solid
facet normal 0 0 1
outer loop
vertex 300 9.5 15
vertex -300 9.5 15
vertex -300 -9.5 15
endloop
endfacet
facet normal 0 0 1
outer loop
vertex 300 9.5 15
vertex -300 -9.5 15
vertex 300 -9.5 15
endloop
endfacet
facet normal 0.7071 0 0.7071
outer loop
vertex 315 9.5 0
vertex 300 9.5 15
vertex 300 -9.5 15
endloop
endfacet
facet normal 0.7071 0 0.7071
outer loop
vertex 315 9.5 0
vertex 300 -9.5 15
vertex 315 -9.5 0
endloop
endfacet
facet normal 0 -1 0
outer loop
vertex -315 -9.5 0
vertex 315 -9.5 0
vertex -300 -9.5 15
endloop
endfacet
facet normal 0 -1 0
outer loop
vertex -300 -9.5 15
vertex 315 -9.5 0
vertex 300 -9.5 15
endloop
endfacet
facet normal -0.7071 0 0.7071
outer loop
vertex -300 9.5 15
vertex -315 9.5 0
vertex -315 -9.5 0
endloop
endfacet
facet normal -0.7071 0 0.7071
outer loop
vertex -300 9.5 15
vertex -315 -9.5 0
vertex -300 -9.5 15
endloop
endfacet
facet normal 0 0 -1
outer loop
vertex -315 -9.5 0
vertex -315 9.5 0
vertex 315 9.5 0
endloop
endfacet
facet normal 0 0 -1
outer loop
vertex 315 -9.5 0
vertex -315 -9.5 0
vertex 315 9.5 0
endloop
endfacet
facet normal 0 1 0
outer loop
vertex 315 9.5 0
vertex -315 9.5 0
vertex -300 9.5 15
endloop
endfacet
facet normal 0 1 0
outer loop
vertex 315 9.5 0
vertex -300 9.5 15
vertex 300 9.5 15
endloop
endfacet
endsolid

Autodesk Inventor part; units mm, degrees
ref_plane "YZ Plane" through (0, 0, 0) normal (1, 0, 0) x (0, 1, 0)
ref_plane "XZ Plane" through (0, 0, 0) normal (0, 1, 0) x (-1, 0, 0)
ref_plane "XY Plane" through (0, 0, 0) normal (0, 0, 1) x (1, 0, 0)
sketch "Sketch1" plane through (0, 0, 0) normal (0, 0, 1) x (1, 0, 0)
  line L0 (315, -9.5) -> (-315, -9.5)
  line L1 (-315, -9.5) -> (-315, 9.5)
  line L2 (-315, 9.5) -> (315, 9.5)
  line L3 (315, 9.5) -> (315, -9.5)
  line L4 (315, -9.5) -> (-315, 9.5) construction
  line L5 (-315, -9.5) -> (315, 9.5) construction
  point P0 (0, 0)
  dimension "d0" = 630
  dimension "d1" = 19
extrude "Extrusion1" add sketch "Sketch1" along normal blind 15
sketch "Sketch2" plane through (-315, 9.5, 0) normal (0, 1, 0) x (1, 0, 0)
  line L0 (630, 0) -> (0, 0) projected
  line L1 (0, 0) -> (15, -15)
  line L2 (630, -15) -> (0, -15) projected
  line L3 (15, -15) -> (0, -15)
  line L4 (0, -15) -> (0, 0)
  point P0 (315, 0)
  dimension "d4" = 45
extrude "Extrusion2" cut sketch "Sketch2" against normal through all
mirror "Mirror1" about plane through (0, 0, 0) normal (1, 0, 0) of "Extrusion2"
ref_plane "Work Plane1" through (0, 0, 0) normal (1, 0, 0) x (0, 1, 0)
properties part number "lengthBinding"
